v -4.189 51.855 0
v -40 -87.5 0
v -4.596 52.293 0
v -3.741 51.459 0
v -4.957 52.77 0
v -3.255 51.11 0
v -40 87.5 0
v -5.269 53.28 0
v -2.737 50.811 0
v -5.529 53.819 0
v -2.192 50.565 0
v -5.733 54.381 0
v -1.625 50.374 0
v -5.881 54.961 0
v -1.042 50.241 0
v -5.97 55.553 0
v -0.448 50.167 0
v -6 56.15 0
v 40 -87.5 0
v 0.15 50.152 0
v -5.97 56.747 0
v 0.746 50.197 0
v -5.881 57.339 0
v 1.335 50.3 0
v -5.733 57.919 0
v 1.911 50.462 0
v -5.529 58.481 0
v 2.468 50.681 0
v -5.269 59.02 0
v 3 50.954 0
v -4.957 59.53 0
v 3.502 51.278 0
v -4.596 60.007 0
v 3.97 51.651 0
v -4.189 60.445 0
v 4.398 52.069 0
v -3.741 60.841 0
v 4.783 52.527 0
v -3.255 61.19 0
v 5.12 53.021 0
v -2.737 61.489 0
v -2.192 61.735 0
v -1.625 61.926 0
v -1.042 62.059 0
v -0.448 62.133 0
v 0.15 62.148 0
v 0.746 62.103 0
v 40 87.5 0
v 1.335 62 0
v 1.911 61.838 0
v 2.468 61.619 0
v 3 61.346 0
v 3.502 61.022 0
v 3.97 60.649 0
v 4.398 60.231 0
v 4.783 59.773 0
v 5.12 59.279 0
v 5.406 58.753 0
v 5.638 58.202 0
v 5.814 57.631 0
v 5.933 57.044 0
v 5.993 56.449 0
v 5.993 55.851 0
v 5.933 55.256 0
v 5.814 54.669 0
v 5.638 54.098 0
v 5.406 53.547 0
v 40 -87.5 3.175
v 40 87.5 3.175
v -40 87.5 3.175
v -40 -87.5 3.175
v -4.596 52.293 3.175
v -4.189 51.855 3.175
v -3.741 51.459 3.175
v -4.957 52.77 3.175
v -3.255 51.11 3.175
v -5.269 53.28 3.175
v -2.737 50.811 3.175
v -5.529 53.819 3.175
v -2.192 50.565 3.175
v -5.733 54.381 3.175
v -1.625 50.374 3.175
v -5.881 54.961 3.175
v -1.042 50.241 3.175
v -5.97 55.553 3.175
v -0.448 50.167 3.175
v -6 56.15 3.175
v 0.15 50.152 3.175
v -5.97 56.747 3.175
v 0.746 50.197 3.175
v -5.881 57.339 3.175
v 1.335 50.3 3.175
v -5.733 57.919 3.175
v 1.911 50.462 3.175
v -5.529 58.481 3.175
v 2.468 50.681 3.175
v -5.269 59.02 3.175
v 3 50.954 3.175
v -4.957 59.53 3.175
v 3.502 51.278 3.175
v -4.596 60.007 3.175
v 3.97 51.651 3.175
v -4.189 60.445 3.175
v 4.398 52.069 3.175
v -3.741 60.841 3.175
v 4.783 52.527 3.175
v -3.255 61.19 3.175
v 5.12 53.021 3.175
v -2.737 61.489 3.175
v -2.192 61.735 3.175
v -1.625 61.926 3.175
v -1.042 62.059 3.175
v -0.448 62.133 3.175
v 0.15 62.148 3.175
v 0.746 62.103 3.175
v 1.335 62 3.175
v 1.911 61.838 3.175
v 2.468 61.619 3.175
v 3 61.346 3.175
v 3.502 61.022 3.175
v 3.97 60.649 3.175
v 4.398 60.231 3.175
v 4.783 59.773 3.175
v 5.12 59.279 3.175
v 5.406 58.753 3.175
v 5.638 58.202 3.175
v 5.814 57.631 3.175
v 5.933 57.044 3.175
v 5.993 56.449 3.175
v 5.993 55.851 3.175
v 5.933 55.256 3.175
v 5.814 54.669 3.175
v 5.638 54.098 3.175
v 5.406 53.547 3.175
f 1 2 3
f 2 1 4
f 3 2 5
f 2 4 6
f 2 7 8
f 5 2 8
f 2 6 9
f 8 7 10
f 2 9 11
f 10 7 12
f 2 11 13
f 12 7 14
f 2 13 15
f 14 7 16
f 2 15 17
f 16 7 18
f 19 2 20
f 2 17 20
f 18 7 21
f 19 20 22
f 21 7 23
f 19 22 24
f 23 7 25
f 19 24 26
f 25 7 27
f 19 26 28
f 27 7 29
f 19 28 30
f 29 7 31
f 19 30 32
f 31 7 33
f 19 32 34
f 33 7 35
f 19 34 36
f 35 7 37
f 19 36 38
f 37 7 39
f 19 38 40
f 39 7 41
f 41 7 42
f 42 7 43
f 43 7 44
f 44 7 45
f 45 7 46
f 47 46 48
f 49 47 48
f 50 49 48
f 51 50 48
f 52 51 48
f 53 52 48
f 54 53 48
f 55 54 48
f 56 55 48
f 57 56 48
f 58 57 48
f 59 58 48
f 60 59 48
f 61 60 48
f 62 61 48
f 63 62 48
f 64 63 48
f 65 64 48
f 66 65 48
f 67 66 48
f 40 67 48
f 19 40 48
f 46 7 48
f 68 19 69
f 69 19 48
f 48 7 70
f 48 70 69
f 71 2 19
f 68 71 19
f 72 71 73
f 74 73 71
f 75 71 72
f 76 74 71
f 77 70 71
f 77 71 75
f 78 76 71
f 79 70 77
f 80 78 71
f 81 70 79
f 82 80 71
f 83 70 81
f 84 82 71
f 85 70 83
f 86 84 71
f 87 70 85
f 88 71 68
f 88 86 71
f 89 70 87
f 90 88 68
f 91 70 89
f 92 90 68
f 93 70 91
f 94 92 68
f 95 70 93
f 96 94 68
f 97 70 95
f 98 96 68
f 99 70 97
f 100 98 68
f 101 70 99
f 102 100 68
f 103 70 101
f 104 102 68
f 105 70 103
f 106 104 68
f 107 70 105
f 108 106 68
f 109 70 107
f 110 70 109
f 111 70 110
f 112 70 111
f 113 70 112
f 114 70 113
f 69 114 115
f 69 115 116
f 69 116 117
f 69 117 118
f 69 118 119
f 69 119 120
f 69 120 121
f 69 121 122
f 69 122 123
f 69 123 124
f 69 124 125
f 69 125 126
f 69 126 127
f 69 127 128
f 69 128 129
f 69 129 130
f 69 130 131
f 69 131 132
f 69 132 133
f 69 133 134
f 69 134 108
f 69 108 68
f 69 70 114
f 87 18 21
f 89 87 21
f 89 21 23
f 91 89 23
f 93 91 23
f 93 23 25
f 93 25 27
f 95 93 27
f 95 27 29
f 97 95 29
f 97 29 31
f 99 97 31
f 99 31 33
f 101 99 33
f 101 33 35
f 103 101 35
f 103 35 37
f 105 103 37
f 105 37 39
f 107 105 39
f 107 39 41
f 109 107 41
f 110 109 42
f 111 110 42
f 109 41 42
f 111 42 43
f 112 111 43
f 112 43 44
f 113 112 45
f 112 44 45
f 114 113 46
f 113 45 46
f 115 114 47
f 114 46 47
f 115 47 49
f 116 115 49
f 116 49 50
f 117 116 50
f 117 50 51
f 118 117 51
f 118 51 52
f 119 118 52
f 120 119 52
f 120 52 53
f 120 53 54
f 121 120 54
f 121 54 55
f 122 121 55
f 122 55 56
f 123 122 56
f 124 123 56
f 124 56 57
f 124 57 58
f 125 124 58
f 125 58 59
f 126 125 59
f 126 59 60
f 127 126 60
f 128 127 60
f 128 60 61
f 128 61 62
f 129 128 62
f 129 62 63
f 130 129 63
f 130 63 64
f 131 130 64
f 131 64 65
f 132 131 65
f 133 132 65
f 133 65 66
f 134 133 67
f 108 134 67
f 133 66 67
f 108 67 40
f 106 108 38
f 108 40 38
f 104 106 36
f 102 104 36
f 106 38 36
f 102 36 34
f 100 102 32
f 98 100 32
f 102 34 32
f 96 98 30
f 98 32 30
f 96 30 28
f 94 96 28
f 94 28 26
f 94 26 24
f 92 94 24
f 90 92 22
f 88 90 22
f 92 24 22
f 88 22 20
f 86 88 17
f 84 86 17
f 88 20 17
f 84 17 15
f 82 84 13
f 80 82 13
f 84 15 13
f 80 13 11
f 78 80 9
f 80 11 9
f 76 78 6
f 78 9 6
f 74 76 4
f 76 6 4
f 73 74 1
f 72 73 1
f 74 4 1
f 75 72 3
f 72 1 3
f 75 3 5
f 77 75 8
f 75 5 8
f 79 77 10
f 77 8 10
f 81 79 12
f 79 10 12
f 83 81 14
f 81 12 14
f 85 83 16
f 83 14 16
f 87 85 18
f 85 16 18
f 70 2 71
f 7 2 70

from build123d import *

# Parameters (mm, degrees)
SKETCH1_W                  = 80
SKETCH1_H                  = 175
BOSS_EXTRUDE1_DEPTH        = 3.175
F_12_0MM_DOWEL_HOLE1_D     = 12
F_12_0MM_DOWEL_HOLE1_DEPTH = 3.175


with BuildPart() as part:
    # Sketch1 → Boss-Extrude1 (new body)
    with BuildSketch(Plane.XY):
        Rectangle(SKETCH1_W, SKETCH1_H)
    extrude(amount=BOSS_EXTRUDE1_DEPTH)

    # Ø12.0mm Dowel Hole1
    with Locations(Plane.XY.offset(3.175)):
        with Locations((0, 56.15)):
            Hole(F_12_0MM_DOWEL_HOLE1_D / 2, depth=F_12_0MM_DOWEL_HOLE1_DEPTH)


solid = part.part
